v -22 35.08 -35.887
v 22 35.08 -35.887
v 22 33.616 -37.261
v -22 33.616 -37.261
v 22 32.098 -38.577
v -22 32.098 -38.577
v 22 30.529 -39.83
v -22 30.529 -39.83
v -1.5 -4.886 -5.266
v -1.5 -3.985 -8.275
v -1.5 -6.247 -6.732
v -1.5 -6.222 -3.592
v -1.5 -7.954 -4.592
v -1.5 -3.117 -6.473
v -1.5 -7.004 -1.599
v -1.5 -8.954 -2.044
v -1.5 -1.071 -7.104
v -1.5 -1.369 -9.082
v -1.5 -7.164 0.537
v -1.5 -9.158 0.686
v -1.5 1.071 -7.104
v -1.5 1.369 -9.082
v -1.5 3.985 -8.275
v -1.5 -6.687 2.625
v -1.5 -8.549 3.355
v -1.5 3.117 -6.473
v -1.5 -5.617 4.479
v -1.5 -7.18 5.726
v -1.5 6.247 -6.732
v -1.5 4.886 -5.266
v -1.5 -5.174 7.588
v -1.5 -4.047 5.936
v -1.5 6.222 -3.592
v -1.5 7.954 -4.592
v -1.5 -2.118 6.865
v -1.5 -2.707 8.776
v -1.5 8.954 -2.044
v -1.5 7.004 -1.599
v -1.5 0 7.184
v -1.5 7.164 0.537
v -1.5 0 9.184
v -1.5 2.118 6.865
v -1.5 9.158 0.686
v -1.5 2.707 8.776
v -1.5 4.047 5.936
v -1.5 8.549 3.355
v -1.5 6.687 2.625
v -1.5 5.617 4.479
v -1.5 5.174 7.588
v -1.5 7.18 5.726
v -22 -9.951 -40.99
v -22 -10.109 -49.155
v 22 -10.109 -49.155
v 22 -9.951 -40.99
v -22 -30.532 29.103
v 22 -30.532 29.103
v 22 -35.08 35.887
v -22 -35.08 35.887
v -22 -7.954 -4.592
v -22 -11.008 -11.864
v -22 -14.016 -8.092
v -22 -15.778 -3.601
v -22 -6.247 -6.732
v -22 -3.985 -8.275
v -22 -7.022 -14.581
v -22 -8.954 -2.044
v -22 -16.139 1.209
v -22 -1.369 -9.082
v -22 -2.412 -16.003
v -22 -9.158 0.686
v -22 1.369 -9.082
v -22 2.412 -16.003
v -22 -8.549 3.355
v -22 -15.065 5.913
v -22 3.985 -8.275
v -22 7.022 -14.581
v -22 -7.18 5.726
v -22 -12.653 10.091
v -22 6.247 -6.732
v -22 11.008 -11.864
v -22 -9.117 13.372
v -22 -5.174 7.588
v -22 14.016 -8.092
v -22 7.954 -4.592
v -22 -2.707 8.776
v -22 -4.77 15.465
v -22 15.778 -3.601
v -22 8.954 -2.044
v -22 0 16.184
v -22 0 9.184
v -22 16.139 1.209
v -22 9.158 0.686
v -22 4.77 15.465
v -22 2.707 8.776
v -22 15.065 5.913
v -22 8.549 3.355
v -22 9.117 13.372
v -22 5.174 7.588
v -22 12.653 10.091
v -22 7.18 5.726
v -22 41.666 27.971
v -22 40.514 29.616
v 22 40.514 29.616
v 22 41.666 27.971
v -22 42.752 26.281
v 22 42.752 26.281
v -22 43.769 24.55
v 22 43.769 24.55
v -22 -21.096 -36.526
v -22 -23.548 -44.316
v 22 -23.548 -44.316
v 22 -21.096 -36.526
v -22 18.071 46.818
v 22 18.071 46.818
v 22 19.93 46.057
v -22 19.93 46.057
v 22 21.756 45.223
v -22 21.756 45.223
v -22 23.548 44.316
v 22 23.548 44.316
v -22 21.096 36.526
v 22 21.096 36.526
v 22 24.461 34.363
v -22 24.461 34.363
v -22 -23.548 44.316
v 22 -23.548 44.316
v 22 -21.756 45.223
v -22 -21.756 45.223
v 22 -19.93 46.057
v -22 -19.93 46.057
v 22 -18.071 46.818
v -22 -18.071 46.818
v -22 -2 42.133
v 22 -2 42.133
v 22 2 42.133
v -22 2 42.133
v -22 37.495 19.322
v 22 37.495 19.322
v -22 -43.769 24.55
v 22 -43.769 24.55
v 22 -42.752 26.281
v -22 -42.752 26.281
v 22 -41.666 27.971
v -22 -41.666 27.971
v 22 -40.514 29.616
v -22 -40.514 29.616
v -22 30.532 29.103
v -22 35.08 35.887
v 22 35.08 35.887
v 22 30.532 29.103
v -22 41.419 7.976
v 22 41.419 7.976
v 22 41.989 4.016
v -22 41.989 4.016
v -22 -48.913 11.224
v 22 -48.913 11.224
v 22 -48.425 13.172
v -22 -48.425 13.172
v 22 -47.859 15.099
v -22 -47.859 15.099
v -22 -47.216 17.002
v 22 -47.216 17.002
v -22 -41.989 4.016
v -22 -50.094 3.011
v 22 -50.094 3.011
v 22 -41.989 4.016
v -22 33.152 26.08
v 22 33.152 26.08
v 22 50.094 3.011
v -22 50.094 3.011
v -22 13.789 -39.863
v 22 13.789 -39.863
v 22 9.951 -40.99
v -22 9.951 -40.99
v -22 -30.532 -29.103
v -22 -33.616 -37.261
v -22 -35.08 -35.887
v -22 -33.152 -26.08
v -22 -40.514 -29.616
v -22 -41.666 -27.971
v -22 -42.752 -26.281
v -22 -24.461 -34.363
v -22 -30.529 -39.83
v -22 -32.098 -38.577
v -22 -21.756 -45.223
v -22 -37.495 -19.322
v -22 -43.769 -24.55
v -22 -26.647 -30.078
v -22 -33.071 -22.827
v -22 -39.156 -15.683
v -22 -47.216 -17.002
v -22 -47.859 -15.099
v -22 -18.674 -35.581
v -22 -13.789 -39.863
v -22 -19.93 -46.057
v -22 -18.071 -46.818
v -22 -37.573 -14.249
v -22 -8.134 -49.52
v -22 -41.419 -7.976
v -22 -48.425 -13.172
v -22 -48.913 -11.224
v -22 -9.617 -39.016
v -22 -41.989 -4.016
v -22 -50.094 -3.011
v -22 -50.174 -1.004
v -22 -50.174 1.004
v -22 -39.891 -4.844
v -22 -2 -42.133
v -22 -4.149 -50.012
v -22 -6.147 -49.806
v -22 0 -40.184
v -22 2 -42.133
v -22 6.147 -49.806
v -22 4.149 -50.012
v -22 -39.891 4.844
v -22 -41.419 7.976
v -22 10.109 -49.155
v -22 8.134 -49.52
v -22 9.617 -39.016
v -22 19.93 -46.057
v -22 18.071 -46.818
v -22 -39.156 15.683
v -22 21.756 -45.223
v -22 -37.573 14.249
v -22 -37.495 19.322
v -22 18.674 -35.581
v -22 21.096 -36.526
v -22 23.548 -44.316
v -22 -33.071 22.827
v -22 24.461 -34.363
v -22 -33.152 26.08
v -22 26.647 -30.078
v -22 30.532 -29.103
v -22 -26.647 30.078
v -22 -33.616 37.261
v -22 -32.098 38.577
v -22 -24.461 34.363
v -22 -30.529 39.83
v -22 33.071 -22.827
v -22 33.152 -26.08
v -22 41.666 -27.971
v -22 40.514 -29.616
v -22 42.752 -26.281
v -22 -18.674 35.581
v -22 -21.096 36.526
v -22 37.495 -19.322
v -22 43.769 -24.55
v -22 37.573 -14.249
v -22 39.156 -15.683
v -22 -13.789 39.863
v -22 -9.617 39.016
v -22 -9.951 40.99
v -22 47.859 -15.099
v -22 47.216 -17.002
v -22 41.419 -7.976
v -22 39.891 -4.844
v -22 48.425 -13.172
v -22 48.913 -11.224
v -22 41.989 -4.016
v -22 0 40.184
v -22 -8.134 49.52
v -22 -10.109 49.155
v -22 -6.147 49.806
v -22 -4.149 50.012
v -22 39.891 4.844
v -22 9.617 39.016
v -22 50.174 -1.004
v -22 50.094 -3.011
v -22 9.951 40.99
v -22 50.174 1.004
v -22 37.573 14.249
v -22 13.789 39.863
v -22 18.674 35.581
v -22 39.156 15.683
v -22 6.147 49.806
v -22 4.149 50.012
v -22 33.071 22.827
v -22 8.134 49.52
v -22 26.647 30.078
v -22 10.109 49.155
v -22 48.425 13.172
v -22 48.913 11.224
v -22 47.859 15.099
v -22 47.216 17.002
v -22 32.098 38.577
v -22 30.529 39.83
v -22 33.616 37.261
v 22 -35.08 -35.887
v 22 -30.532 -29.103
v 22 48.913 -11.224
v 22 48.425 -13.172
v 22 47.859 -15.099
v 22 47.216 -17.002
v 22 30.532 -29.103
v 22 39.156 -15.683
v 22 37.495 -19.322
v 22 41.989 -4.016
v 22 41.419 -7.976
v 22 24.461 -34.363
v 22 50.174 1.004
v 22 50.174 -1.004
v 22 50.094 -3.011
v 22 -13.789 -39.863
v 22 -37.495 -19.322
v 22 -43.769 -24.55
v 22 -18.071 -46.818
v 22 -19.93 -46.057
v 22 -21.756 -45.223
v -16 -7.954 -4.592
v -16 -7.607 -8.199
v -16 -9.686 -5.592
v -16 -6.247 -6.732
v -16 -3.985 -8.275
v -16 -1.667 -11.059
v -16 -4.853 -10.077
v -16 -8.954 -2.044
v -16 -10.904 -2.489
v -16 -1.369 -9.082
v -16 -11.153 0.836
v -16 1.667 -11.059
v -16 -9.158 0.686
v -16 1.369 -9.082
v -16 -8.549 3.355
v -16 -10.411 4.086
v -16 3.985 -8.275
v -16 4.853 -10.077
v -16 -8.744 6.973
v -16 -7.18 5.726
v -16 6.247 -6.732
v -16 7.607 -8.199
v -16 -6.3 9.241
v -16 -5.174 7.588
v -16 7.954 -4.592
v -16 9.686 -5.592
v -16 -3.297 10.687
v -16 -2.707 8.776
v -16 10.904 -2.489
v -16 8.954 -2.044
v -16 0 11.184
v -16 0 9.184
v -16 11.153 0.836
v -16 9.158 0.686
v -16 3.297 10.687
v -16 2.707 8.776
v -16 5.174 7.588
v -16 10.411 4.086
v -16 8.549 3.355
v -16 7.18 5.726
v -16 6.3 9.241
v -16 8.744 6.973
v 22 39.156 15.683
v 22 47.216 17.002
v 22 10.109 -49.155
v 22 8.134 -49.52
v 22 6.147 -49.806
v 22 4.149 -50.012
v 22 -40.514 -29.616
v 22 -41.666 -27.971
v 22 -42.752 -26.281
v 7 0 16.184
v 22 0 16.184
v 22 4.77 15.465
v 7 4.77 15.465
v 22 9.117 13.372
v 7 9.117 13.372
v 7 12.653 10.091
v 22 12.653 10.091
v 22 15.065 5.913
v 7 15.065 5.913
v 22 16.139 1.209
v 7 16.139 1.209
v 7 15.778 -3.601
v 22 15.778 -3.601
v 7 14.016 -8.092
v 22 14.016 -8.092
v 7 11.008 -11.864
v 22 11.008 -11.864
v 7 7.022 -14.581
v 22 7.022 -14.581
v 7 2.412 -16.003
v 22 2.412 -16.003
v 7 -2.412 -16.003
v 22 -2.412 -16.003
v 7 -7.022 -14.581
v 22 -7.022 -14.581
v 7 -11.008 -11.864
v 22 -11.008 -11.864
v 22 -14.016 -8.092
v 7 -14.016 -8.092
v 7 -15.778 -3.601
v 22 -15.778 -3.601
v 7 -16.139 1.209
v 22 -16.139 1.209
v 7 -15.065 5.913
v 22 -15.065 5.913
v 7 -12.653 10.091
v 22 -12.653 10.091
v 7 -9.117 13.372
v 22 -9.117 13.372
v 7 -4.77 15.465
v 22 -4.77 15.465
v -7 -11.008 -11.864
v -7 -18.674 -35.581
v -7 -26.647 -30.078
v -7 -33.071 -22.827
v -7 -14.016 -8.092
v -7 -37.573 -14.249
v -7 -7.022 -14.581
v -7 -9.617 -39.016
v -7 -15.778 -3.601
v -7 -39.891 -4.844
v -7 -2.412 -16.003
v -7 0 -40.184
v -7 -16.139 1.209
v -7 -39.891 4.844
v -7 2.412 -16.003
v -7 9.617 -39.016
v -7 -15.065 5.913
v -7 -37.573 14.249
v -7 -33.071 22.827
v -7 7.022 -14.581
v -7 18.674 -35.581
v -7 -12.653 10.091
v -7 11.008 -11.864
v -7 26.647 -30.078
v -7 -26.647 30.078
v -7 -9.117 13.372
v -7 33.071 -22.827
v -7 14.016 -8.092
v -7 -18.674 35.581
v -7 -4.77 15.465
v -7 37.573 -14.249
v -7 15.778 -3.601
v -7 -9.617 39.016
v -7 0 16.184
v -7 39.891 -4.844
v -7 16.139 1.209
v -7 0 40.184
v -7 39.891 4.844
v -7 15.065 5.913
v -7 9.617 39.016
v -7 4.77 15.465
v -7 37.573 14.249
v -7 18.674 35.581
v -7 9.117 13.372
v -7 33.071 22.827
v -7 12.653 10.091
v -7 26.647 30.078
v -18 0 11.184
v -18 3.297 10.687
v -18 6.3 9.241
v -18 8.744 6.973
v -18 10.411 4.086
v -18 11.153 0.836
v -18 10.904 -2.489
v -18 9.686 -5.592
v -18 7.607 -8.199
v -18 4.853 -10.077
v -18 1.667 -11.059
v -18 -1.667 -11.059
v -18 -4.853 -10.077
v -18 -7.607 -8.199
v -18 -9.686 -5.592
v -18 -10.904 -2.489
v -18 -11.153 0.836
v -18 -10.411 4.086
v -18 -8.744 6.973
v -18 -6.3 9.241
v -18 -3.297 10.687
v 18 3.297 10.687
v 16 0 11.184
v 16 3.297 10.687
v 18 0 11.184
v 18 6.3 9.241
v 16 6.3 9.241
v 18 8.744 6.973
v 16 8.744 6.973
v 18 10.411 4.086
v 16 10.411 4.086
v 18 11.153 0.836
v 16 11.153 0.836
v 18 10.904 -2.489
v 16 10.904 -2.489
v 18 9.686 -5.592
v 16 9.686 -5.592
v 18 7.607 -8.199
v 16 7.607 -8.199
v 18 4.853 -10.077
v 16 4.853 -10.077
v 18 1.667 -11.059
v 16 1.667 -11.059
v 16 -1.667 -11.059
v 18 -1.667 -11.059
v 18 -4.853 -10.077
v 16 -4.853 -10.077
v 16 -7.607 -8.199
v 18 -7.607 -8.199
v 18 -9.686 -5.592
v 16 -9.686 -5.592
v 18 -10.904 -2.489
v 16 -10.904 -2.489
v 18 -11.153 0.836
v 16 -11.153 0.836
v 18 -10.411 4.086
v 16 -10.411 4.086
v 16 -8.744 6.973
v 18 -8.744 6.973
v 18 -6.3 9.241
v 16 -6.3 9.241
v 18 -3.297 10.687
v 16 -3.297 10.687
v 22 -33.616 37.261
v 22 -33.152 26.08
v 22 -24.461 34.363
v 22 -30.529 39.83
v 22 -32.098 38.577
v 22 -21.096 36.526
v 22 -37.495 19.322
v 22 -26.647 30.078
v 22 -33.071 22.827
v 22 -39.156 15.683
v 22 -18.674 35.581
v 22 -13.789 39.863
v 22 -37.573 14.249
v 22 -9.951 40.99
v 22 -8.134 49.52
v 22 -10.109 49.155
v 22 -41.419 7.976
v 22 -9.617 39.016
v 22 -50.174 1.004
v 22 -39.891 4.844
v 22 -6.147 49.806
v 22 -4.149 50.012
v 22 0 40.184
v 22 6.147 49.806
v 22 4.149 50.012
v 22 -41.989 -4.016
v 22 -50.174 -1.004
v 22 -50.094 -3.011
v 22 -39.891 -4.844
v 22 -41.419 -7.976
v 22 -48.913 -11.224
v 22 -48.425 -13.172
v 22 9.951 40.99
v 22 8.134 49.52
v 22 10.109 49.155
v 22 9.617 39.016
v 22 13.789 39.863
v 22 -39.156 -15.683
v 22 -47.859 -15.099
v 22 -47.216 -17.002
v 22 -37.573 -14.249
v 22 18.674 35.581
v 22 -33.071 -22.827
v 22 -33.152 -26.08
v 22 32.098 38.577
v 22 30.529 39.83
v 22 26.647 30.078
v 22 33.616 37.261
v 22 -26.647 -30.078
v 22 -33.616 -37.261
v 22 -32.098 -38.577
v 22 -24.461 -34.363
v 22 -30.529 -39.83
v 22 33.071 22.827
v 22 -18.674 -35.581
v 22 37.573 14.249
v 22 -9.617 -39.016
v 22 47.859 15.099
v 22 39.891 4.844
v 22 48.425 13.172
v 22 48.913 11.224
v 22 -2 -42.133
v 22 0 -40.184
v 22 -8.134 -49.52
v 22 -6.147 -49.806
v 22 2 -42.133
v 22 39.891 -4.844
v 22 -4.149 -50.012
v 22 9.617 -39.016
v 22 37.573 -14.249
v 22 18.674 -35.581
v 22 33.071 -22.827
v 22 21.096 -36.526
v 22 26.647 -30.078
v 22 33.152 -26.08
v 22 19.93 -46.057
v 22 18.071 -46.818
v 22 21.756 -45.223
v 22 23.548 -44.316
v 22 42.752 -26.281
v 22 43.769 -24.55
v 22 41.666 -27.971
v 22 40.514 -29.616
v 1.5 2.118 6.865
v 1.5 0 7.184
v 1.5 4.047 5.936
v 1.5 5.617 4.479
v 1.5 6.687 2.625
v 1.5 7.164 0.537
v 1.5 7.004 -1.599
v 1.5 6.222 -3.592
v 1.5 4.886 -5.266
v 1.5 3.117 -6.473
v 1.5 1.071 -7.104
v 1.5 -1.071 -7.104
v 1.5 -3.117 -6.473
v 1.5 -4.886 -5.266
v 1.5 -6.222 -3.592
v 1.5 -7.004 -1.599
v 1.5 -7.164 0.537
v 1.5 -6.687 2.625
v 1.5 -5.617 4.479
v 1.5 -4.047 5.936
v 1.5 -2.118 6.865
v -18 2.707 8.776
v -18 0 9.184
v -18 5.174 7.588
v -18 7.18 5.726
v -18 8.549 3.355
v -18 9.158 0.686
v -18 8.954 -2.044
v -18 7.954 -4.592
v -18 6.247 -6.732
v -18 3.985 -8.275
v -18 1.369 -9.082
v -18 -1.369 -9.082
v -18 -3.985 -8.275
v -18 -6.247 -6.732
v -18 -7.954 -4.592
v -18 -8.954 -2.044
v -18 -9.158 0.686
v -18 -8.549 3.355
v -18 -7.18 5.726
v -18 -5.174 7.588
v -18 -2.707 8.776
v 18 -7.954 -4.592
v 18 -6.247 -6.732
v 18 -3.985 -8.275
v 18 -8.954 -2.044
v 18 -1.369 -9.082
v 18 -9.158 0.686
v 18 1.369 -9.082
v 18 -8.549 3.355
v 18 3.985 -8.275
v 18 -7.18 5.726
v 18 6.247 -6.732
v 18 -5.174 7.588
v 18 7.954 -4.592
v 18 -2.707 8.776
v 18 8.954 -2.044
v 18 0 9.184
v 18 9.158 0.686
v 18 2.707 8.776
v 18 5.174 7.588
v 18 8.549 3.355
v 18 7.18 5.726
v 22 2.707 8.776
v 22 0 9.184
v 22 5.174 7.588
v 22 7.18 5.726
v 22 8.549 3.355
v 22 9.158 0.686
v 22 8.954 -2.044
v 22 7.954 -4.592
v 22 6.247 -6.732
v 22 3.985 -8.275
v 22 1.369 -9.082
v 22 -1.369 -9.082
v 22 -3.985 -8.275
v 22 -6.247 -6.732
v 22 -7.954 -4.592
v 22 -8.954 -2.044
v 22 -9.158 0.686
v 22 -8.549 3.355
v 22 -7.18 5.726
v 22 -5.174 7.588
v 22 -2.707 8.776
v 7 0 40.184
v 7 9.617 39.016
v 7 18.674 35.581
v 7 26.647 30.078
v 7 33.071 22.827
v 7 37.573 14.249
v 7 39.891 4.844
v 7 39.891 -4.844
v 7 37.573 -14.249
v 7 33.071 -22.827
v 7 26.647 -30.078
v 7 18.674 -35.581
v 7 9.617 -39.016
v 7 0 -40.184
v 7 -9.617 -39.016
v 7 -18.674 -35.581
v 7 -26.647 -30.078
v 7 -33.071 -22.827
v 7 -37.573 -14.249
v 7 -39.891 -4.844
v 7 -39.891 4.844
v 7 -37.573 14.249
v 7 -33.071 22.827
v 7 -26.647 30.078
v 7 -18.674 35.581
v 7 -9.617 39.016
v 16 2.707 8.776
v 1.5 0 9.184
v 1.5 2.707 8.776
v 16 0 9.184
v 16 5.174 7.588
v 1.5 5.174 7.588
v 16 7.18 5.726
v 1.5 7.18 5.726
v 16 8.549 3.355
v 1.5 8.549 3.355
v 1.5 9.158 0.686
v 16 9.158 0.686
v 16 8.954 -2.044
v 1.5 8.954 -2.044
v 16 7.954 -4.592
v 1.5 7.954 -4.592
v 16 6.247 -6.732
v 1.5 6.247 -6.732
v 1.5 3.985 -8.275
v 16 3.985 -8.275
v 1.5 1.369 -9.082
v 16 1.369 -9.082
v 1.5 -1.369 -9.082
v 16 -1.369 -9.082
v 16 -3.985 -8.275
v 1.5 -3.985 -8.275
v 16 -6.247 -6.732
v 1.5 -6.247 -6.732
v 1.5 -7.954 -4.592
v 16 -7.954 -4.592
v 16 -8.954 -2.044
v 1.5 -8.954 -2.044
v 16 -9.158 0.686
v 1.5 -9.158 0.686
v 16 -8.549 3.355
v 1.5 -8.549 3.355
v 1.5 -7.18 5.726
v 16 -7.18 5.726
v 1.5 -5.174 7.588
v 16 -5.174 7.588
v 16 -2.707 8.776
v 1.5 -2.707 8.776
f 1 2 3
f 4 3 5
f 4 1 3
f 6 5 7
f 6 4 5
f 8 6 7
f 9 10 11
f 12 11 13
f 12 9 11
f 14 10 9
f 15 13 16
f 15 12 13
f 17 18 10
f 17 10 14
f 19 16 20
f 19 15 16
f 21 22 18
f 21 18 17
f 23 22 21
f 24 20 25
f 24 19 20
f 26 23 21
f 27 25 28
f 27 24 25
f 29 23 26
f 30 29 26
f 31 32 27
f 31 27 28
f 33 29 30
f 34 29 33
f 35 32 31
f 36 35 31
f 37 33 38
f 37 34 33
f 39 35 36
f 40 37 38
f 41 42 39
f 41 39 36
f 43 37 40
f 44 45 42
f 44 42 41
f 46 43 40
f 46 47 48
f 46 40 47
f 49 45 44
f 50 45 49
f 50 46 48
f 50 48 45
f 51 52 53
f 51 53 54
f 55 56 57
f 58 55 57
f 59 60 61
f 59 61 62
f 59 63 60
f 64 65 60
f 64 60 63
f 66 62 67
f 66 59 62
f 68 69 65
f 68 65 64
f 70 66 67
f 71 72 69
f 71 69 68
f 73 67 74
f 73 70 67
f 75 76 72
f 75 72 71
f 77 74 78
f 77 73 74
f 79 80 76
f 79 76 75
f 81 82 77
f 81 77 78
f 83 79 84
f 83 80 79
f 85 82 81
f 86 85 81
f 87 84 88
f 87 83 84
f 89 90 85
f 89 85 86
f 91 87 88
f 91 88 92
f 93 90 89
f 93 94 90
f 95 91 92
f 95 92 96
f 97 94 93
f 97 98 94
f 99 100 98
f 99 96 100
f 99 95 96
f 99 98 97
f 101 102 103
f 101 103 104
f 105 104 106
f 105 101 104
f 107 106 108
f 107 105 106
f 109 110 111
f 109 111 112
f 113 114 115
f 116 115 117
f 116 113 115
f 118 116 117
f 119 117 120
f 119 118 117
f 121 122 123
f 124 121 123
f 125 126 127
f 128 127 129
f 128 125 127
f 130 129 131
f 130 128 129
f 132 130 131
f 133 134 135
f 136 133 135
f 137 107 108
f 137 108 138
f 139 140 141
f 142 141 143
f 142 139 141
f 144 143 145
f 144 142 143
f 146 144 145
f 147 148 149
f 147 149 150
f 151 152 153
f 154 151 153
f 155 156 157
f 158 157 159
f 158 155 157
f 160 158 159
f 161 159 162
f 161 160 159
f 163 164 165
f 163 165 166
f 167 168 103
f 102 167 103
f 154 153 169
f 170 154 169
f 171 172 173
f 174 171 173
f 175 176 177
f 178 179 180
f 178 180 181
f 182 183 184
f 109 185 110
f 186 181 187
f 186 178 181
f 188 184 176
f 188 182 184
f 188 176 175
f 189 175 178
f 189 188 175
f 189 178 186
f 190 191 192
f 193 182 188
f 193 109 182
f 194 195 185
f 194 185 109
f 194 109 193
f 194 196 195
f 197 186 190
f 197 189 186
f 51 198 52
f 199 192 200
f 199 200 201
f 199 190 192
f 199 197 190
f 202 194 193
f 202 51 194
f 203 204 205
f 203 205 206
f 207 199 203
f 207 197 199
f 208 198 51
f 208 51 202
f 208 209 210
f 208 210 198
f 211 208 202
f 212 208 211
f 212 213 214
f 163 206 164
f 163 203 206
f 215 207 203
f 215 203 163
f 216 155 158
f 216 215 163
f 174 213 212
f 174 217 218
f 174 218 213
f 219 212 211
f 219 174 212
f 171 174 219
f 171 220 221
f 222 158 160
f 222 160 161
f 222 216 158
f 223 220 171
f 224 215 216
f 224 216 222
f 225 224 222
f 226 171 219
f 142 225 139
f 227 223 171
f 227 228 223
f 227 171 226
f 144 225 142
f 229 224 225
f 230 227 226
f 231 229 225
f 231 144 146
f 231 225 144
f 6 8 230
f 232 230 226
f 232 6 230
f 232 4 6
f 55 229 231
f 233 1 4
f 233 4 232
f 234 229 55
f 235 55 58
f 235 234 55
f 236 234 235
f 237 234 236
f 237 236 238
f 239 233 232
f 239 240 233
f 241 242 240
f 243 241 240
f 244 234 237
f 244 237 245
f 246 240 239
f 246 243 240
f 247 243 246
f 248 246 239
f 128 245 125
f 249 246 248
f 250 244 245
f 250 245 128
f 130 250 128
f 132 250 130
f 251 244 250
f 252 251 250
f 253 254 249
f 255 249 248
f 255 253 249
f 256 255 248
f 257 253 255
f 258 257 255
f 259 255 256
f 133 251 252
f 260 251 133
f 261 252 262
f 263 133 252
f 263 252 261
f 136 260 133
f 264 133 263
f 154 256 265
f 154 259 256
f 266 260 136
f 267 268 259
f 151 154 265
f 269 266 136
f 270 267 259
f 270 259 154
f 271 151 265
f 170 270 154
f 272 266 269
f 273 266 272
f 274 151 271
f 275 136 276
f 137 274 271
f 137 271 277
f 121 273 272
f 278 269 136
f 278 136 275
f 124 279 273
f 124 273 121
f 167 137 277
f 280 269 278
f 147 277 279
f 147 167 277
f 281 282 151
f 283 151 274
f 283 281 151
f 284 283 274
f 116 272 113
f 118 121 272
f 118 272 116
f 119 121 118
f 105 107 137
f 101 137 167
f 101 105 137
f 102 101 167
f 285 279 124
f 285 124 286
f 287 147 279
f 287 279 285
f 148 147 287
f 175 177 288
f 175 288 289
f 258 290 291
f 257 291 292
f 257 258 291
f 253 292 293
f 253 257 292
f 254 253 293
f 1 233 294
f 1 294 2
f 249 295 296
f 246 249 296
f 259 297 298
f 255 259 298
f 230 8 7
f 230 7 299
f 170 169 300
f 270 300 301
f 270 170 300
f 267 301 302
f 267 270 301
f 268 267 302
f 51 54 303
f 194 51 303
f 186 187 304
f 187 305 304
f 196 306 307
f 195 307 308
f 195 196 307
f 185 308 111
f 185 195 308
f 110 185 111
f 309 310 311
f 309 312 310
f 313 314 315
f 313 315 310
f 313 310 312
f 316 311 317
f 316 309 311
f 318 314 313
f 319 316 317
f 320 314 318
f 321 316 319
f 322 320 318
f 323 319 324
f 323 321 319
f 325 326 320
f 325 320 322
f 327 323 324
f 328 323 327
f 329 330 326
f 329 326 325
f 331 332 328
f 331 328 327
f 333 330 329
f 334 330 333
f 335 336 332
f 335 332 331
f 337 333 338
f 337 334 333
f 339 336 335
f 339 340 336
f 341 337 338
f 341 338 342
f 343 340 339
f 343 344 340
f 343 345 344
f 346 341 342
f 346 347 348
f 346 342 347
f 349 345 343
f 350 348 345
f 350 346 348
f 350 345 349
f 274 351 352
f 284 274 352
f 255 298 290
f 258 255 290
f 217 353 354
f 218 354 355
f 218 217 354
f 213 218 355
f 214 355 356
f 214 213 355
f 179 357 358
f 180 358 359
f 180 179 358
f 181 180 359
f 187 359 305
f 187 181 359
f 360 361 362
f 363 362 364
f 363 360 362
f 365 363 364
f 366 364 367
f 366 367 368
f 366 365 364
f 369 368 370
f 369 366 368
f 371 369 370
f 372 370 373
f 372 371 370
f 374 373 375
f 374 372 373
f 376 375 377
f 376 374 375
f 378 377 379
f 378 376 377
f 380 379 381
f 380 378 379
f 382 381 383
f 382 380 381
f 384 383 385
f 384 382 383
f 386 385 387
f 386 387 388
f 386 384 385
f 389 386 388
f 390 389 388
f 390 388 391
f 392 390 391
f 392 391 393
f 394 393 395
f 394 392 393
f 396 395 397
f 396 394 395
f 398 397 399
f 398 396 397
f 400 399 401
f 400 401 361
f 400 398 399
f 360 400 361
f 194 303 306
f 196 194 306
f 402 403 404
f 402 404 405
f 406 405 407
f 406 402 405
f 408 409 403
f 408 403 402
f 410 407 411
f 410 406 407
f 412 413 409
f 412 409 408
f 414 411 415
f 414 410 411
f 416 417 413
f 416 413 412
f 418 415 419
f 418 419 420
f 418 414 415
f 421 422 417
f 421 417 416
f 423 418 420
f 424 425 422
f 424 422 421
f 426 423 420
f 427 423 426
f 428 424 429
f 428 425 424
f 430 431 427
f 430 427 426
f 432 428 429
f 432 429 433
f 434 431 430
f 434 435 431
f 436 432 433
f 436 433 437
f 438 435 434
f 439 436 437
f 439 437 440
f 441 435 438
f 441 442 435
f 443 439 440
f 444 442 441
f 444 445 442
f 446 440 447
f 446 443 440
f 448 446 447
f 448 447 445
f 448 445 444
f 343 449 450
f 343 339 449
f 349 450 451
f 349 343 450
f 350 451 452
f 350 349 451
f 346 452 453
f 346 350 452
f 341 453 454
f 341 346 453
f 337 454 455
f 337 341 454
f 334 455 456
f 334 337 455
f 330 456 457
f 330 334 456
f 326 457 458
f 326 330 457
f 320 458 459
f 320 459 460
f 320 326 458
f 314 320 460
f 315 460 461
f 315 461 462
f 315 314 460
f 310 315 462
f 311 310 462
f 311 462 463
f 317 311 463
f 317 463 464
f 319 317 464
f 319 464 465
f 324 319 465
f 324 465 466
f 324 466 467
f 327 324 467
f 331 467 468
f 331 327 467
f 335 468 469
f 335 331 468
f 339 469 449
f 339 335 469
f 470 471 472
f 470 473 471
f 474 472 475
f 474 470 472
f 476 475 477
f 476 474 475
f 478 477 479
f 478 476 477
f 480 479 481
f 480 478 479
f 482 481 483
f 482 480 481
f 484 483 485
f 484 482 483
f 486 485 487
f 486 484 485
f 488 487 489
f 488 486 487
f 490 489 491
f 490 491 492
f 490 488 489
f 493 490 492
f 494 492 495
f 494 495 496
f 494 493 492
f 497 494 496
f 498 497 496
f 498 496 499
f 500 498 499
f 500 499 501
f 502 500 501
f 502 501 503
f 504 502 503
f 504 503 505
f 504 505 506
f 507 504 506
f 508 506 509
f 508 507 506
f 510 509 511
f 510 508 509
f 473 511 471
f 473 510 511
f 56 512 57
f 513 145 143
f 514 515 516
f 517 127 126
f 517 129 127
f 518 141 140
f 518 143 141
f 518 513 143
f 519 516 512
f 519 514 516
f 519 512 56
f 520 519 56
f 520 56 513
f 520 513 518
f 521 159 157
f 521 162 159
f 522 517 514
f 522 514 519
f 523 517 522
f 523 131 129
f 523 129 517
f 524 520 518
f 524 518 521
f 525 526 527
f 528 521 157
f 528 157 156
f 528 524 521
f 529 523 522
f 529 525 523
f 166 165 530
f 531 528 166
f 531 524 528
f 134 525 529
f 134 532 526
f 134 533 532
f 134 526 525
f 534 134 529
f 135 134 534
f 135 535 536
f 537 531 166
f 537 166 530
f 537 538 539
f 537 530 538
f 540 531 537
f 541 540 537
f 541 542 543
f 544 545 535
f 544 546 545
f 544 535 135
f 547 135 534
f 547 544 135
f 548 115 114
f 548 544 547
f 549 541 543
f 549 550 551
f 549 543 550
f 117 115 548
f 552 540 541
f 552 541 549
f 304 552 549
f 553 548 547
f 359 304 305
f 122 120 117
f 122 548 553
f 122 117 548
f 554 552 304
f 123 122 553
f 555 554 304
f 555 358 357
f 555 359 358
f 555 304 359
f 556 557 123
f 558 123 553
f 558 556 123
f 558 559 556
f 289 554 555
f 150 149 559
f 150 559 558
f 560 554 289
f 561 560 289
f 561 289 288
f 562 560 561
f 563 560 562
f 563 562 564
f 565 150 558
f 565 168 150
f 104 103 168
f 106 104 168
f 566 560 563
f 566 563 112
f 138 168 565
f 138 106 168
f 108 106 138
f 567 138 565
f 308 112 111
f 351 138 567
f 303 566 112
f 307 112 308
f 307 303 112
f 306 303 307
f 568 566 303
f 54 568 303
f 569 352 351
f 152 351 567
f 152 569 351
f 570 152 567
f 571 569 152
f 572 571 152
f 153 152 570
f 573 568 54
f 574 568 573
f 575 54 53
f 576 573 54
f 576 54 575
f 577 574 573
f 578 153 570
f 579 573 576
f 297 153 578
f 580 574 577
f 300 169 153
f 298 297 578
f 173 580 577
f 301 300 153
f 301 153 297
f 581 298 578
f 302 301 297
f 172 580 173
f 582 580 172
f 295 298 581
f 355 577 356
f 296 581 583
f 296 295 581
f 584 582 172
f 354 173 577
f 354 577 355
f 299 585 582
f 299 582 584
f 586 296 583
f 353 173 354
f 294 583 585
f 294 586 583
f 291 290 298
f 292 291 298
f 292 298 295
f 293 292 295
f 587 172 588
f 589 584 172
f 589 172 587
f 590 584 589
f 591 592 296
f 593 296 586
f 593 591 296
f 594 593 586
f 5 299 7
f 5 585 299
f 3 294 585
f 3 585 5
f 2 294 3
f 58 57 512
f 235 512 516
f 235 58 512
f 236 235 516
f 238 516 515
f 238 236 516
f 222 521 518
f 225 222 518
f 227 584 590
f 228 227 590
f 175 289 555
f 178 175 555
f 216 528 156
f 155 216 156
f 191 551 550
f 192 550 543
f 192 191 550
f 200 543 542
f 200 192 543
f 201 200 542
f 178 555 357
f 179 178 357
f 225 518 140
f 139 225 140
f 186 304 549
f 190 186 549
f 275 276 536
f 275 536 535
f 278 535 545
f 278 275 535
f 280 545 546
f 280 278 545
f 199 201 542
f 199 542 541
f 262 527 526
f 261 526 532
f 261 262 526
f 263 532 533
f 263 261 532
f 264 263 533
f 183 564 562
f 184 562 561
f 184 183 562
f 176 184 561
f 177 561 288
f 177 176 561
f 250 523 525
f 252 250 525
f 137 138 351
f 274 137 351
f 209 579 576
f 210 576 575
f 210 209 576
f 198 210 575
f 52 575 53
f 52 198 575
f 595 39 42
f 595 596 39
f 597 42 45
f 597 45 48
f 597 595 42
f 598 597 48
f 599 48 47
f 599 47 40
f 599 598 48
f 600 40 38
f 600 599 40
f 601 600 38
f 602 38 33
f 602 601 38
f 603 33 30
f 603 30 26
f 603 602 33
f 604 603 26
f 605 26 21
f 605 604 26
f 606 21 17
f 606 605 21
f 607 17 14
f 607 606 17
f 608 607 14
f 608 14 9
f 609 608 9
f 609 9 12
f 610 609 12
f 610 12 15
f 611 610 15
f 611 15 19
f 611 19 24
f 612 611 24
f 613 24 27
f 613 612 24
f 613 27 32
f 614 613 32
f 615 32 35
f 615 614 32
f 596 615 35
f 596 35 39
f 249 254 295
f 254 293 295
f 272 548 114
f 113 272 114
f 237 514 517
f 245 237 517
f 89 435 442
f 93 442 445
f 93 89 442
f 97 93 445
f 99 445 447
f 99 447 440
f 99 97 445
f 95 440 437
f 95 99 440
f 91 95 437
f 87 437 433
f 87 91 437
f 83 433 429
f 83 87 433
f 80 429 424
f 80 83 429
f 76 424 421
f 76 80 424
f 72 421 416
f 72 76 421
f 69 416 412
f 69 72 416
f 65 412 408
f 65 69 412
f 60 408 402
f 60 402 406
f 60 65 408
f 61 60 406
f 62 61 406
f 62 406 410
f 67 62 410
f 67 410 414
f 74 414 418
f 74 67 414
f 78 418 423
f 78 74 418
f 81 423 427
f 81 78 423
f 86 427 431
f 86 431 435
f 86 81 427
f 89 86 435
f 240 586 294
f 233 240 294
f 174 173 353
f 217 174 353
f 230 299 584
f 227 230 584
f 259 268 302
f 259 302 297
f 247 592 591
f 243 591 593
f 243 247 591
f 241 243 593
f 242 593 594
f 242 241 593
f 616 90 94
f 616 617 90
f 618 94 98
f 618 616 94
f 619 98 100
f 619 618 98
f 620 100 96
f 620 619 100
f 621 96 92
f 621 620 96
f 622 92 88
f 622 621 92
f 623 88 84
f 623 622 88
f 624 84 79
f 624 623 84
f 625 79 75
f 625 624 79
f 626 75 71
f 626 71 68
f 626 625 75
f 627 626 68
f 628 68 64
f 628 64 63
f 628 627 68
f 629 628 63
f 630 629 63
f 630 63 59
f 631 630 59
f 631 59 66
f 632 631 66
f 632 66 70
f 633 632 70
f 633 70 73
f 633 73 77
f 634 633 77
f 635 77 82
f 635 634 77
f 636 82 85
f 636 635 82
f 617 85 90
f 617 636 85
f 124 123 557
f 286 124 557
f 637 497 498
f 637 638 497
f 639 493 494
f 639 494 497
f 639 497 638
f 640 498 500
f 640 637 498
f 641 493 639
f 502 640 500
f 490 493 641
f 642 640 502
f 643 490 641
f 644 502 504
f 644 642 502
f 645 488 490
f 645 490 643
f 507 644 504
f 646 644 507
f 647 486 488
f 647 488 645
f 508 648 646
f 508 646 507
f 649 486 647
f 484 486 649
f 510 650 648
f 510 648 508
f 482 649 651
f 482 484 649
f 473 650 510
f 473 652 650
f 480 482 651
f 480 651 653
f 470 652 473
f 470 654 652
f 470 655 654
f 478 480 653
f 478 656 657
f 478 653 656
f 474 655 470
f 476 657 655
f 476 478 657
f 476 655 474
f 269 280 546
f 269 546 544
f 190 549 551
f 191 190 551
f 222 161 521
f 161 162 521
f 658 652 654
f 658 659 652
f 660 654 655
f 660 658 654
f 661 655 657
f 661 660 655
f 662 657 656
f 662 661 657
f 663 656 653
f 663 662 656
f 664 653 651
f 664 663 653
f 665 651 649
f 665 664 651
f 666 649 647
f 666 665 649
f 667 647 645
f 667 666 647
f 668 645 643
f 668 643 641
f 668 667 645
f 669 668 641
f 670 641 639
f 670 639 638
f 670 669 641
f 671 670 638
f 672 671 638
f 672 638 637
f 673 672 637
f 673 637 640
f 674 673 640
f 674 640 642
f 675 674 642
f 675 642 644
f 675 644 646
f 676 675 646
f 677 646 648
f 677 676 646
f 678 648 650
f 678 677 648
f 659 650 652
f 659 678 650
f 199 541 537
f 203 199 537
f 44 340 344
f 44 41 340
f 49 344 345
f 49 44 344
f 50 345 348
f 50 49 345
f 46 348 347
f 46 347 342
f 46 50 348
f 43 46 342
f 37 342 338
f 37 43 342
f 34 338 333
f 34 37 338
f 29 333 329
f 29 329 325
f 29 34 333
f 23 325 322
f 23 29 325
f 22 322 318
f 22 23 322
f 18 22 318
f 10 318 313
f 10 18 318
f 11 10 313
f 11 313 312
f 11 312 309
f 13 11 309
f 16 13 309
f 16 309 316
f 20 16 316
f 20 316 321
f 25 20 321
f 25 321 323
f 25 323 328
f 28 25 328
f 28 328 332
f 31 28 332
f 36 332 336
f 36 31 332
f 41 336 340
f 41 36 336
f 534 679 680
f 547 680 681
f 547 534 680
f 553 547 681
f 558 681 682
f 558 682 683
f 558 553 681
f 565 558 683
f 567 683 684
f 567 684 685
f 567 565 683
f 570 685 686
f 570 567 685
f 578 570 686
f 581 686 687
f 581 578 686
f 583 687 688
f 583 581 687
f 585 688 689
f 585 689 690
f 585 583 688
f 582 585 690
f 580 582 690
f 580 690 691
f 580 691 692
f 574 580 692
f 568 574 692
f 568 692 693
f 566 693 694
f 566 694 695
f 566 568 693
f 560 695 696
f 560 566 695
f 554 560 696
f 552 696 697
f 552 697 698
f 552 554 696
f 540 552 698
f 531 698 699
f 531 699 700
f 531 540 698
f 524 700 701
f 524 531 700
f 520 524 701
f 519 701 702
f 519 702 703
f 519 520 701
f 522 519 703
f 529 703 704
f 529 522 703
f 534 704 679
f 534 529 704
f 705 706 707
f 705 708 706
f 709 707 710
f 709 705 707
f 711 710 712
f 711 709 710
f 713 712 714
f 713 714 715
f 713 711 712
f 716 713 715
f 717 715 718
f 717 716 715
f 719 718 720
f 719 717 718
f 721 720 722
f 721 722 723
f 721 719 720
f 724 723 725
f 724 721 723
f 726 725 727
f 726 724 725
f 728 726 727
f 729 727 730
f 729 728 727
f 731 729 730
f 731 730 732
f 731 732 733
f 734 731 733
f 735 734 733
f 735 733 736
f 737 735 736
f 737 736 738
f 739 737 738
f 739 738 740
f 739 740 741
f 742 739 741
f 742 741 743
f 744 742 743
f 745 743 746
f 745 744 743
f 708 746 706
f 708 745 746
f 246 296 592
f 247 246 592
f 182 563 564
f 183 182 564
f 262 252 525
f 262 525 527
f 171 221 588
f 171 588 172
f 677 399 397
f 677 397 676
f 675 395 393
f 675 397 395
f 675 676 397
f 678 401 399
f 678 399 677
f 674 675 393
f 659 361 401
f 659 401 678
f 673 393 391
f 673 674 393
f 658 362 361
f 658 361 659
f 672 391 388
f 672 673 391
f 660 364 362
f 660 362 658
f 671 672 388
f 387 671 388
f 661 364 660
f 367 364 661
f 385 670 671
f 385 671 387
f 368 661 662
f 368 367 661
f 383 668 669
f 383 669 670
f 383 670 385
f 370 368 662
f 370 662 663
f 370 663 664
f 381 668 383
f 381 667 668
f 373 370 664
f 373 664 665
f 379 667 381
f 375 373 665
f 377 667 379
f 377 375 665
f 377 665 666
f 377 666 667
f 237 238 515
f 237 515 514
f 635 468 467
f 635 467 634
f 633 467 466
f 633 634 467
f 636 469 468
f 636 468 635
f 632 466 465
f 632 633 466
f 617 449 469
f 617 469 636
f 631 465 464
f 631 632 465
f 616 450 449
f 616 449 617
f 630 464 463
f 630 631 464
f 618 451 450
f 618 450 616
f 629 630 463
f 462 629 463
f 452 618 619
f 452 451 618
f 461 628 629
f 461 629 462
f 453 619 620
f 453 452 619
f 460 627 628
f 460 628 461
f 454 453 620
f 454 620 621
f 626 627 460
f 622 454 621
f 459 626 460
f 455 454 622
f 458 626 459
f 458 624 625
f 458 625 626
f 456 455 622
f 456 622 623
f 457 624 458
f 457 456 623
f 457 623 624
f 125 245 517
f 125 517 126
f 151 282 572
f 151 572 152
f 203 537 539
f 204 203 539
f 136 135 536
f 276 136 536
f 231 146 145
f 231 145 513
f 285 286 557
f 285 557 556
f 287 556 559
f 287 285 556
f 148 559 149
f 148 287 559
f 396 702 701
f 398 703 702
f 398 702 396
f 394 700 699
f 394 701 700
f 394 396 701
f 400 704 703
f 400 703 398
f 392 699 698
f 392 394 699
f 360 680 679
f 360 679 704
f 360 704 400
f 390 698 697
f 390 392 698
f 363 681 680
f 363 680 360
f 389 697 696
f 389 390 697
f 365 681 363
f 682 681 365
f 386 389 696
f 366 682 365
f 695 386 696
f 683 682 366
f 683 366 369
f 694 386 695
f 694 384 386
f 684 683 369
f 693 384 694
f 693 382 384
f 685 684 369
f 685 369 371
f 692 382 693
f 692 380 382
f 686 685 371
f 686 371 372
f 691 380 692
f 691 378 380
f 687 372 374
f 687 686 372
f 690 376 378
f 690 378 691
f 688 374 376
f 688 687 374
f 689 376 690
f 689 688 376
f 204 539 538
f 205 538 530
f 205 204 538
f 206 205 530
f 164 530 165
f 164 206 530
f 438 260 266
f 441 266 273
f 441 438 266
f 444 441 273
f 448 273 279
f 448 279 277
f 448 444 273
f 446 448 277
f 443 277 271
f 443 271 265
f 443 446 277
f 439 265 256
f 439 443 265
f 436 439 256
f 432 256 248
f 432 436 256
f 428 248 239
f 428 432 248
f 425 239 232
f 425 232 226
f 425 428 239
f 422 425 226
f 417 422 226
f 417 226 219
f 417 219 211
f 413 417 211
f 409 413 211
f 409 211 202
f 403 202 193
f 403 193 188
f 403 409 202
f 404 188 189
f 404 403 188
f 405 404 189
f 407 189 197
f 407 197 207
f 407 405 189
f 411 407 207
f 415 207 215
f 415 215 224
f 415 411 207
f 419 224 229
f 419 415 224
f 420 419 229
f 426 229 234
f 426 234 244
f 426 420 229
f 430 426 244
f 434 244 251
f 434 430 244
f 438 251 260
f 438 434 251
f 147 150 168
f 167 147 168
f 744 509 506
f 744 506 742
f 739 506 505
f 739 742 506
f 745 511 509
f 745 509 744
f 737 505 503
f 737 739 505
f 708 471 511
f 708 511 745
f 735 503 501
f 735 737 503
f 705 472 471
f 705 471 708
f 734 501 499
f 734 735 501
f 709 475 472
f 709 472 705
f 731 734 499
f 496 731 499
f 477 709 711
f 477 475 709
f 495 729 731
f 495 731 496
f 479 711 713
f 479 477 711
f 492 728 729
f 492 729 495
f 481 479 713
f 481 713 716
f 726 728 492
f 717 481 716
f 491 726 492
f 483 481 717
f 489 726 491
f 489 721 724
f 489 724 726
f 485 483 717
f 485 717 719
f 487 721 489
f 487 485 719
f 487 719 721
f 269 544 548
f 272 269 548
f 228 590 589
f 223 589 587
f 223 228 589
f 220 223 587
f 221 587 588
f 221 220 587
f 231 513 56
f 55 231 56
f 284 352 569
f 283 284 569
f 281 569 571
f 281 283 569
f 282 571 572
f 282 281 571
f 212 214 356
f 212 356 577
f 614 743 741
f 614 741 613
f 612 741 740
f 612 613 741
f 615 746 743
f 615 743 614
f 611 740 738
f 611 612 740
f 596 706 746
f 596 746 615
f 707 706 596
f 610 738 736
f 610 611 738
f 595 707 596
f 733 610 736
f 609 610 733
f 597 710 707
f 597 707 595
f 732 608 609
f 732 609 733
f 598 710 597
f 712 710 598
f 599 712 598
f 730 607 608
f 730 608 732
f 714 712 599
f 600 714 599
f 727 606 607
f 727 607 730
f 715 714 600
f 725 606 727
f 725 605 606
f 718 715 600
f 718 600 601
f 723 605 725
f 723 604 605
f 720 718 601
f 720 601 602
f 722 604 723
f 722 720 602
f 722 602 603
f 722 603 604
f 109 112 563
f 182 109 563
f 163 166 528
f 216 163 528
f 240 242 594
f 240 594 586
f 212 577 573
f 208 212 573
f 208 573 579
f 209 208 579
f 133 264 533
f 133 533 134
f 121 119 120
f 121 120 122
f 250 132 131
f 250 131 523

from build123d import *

# Parameters (mm, degrees)
F3_DEPTH        = 48.6
F3_COPIES_COUNT = 22


# Not quite as in the source:
# - a pattern or mirror of a feature is missing from the dataset's text; its kind, count and spacing are read off the source's solid


with BuildPart() as f1:
    # F0 (on Front) → F1 (revolve)
    with BuildSketch(Plane.XZ):
        Polygon((22, 50.1841045916), (0, 50.1841045916), (-22, 50.1841045916), (-22, 40.1841045916), (-7, 40.1841045916), (-7, 16.1841045916), (-22, 16.1841045916), (-22, 9.1841045916), (-18, 9.1841045916), (-18, 11.1841045916), (-16, 11.1841045916), (-16, 9.1841045916), (-1.5, 9.1841045916), (-1.5, 7.1841045916), (0, 7.1841045916), (1.5, 7.1841045916), (1.5, 9.1841045916), (16, 9.1841045916), (16, 11.1841045916), (18, 11.1841045916), (18, 9.1841045916), (22, 9.1841045916), (22, 16.1841045916), (7, 16.1841045916), (7, 40.1841045916), (22, 40.1841045916), align=None)
    revolve(axis=Axis((-7.0416135713, 0, 0), (-1, 0, 0)))

    # F2 (on Right) → F3 (cut, symmetric)
    with BuildSketch(Plane.YZ):
        Polygon((-2, 42.1328544021), (0, 42.1328544021), (2, 42.1328544021), (5, 53.1328544021), (0, 53.1328544021), (-5, 53.1328544021), align=None)
    f3 = extrude(amount=F3_DEPTH, both=True, mode=Mode.SUBTRACT)

    # F3_copies: F3 ×22 about axis
    f3_copies_axis = Axis((0, 0, 0), (1, 0, 0))
    for i in range(1, F3_COPIES_COUNT):
        add(f3.rotate(f3_copies_axis, i * 360 / F3_COPIES_COUNT), mode=Mode.SUBTRACT)


solid = f1.part
